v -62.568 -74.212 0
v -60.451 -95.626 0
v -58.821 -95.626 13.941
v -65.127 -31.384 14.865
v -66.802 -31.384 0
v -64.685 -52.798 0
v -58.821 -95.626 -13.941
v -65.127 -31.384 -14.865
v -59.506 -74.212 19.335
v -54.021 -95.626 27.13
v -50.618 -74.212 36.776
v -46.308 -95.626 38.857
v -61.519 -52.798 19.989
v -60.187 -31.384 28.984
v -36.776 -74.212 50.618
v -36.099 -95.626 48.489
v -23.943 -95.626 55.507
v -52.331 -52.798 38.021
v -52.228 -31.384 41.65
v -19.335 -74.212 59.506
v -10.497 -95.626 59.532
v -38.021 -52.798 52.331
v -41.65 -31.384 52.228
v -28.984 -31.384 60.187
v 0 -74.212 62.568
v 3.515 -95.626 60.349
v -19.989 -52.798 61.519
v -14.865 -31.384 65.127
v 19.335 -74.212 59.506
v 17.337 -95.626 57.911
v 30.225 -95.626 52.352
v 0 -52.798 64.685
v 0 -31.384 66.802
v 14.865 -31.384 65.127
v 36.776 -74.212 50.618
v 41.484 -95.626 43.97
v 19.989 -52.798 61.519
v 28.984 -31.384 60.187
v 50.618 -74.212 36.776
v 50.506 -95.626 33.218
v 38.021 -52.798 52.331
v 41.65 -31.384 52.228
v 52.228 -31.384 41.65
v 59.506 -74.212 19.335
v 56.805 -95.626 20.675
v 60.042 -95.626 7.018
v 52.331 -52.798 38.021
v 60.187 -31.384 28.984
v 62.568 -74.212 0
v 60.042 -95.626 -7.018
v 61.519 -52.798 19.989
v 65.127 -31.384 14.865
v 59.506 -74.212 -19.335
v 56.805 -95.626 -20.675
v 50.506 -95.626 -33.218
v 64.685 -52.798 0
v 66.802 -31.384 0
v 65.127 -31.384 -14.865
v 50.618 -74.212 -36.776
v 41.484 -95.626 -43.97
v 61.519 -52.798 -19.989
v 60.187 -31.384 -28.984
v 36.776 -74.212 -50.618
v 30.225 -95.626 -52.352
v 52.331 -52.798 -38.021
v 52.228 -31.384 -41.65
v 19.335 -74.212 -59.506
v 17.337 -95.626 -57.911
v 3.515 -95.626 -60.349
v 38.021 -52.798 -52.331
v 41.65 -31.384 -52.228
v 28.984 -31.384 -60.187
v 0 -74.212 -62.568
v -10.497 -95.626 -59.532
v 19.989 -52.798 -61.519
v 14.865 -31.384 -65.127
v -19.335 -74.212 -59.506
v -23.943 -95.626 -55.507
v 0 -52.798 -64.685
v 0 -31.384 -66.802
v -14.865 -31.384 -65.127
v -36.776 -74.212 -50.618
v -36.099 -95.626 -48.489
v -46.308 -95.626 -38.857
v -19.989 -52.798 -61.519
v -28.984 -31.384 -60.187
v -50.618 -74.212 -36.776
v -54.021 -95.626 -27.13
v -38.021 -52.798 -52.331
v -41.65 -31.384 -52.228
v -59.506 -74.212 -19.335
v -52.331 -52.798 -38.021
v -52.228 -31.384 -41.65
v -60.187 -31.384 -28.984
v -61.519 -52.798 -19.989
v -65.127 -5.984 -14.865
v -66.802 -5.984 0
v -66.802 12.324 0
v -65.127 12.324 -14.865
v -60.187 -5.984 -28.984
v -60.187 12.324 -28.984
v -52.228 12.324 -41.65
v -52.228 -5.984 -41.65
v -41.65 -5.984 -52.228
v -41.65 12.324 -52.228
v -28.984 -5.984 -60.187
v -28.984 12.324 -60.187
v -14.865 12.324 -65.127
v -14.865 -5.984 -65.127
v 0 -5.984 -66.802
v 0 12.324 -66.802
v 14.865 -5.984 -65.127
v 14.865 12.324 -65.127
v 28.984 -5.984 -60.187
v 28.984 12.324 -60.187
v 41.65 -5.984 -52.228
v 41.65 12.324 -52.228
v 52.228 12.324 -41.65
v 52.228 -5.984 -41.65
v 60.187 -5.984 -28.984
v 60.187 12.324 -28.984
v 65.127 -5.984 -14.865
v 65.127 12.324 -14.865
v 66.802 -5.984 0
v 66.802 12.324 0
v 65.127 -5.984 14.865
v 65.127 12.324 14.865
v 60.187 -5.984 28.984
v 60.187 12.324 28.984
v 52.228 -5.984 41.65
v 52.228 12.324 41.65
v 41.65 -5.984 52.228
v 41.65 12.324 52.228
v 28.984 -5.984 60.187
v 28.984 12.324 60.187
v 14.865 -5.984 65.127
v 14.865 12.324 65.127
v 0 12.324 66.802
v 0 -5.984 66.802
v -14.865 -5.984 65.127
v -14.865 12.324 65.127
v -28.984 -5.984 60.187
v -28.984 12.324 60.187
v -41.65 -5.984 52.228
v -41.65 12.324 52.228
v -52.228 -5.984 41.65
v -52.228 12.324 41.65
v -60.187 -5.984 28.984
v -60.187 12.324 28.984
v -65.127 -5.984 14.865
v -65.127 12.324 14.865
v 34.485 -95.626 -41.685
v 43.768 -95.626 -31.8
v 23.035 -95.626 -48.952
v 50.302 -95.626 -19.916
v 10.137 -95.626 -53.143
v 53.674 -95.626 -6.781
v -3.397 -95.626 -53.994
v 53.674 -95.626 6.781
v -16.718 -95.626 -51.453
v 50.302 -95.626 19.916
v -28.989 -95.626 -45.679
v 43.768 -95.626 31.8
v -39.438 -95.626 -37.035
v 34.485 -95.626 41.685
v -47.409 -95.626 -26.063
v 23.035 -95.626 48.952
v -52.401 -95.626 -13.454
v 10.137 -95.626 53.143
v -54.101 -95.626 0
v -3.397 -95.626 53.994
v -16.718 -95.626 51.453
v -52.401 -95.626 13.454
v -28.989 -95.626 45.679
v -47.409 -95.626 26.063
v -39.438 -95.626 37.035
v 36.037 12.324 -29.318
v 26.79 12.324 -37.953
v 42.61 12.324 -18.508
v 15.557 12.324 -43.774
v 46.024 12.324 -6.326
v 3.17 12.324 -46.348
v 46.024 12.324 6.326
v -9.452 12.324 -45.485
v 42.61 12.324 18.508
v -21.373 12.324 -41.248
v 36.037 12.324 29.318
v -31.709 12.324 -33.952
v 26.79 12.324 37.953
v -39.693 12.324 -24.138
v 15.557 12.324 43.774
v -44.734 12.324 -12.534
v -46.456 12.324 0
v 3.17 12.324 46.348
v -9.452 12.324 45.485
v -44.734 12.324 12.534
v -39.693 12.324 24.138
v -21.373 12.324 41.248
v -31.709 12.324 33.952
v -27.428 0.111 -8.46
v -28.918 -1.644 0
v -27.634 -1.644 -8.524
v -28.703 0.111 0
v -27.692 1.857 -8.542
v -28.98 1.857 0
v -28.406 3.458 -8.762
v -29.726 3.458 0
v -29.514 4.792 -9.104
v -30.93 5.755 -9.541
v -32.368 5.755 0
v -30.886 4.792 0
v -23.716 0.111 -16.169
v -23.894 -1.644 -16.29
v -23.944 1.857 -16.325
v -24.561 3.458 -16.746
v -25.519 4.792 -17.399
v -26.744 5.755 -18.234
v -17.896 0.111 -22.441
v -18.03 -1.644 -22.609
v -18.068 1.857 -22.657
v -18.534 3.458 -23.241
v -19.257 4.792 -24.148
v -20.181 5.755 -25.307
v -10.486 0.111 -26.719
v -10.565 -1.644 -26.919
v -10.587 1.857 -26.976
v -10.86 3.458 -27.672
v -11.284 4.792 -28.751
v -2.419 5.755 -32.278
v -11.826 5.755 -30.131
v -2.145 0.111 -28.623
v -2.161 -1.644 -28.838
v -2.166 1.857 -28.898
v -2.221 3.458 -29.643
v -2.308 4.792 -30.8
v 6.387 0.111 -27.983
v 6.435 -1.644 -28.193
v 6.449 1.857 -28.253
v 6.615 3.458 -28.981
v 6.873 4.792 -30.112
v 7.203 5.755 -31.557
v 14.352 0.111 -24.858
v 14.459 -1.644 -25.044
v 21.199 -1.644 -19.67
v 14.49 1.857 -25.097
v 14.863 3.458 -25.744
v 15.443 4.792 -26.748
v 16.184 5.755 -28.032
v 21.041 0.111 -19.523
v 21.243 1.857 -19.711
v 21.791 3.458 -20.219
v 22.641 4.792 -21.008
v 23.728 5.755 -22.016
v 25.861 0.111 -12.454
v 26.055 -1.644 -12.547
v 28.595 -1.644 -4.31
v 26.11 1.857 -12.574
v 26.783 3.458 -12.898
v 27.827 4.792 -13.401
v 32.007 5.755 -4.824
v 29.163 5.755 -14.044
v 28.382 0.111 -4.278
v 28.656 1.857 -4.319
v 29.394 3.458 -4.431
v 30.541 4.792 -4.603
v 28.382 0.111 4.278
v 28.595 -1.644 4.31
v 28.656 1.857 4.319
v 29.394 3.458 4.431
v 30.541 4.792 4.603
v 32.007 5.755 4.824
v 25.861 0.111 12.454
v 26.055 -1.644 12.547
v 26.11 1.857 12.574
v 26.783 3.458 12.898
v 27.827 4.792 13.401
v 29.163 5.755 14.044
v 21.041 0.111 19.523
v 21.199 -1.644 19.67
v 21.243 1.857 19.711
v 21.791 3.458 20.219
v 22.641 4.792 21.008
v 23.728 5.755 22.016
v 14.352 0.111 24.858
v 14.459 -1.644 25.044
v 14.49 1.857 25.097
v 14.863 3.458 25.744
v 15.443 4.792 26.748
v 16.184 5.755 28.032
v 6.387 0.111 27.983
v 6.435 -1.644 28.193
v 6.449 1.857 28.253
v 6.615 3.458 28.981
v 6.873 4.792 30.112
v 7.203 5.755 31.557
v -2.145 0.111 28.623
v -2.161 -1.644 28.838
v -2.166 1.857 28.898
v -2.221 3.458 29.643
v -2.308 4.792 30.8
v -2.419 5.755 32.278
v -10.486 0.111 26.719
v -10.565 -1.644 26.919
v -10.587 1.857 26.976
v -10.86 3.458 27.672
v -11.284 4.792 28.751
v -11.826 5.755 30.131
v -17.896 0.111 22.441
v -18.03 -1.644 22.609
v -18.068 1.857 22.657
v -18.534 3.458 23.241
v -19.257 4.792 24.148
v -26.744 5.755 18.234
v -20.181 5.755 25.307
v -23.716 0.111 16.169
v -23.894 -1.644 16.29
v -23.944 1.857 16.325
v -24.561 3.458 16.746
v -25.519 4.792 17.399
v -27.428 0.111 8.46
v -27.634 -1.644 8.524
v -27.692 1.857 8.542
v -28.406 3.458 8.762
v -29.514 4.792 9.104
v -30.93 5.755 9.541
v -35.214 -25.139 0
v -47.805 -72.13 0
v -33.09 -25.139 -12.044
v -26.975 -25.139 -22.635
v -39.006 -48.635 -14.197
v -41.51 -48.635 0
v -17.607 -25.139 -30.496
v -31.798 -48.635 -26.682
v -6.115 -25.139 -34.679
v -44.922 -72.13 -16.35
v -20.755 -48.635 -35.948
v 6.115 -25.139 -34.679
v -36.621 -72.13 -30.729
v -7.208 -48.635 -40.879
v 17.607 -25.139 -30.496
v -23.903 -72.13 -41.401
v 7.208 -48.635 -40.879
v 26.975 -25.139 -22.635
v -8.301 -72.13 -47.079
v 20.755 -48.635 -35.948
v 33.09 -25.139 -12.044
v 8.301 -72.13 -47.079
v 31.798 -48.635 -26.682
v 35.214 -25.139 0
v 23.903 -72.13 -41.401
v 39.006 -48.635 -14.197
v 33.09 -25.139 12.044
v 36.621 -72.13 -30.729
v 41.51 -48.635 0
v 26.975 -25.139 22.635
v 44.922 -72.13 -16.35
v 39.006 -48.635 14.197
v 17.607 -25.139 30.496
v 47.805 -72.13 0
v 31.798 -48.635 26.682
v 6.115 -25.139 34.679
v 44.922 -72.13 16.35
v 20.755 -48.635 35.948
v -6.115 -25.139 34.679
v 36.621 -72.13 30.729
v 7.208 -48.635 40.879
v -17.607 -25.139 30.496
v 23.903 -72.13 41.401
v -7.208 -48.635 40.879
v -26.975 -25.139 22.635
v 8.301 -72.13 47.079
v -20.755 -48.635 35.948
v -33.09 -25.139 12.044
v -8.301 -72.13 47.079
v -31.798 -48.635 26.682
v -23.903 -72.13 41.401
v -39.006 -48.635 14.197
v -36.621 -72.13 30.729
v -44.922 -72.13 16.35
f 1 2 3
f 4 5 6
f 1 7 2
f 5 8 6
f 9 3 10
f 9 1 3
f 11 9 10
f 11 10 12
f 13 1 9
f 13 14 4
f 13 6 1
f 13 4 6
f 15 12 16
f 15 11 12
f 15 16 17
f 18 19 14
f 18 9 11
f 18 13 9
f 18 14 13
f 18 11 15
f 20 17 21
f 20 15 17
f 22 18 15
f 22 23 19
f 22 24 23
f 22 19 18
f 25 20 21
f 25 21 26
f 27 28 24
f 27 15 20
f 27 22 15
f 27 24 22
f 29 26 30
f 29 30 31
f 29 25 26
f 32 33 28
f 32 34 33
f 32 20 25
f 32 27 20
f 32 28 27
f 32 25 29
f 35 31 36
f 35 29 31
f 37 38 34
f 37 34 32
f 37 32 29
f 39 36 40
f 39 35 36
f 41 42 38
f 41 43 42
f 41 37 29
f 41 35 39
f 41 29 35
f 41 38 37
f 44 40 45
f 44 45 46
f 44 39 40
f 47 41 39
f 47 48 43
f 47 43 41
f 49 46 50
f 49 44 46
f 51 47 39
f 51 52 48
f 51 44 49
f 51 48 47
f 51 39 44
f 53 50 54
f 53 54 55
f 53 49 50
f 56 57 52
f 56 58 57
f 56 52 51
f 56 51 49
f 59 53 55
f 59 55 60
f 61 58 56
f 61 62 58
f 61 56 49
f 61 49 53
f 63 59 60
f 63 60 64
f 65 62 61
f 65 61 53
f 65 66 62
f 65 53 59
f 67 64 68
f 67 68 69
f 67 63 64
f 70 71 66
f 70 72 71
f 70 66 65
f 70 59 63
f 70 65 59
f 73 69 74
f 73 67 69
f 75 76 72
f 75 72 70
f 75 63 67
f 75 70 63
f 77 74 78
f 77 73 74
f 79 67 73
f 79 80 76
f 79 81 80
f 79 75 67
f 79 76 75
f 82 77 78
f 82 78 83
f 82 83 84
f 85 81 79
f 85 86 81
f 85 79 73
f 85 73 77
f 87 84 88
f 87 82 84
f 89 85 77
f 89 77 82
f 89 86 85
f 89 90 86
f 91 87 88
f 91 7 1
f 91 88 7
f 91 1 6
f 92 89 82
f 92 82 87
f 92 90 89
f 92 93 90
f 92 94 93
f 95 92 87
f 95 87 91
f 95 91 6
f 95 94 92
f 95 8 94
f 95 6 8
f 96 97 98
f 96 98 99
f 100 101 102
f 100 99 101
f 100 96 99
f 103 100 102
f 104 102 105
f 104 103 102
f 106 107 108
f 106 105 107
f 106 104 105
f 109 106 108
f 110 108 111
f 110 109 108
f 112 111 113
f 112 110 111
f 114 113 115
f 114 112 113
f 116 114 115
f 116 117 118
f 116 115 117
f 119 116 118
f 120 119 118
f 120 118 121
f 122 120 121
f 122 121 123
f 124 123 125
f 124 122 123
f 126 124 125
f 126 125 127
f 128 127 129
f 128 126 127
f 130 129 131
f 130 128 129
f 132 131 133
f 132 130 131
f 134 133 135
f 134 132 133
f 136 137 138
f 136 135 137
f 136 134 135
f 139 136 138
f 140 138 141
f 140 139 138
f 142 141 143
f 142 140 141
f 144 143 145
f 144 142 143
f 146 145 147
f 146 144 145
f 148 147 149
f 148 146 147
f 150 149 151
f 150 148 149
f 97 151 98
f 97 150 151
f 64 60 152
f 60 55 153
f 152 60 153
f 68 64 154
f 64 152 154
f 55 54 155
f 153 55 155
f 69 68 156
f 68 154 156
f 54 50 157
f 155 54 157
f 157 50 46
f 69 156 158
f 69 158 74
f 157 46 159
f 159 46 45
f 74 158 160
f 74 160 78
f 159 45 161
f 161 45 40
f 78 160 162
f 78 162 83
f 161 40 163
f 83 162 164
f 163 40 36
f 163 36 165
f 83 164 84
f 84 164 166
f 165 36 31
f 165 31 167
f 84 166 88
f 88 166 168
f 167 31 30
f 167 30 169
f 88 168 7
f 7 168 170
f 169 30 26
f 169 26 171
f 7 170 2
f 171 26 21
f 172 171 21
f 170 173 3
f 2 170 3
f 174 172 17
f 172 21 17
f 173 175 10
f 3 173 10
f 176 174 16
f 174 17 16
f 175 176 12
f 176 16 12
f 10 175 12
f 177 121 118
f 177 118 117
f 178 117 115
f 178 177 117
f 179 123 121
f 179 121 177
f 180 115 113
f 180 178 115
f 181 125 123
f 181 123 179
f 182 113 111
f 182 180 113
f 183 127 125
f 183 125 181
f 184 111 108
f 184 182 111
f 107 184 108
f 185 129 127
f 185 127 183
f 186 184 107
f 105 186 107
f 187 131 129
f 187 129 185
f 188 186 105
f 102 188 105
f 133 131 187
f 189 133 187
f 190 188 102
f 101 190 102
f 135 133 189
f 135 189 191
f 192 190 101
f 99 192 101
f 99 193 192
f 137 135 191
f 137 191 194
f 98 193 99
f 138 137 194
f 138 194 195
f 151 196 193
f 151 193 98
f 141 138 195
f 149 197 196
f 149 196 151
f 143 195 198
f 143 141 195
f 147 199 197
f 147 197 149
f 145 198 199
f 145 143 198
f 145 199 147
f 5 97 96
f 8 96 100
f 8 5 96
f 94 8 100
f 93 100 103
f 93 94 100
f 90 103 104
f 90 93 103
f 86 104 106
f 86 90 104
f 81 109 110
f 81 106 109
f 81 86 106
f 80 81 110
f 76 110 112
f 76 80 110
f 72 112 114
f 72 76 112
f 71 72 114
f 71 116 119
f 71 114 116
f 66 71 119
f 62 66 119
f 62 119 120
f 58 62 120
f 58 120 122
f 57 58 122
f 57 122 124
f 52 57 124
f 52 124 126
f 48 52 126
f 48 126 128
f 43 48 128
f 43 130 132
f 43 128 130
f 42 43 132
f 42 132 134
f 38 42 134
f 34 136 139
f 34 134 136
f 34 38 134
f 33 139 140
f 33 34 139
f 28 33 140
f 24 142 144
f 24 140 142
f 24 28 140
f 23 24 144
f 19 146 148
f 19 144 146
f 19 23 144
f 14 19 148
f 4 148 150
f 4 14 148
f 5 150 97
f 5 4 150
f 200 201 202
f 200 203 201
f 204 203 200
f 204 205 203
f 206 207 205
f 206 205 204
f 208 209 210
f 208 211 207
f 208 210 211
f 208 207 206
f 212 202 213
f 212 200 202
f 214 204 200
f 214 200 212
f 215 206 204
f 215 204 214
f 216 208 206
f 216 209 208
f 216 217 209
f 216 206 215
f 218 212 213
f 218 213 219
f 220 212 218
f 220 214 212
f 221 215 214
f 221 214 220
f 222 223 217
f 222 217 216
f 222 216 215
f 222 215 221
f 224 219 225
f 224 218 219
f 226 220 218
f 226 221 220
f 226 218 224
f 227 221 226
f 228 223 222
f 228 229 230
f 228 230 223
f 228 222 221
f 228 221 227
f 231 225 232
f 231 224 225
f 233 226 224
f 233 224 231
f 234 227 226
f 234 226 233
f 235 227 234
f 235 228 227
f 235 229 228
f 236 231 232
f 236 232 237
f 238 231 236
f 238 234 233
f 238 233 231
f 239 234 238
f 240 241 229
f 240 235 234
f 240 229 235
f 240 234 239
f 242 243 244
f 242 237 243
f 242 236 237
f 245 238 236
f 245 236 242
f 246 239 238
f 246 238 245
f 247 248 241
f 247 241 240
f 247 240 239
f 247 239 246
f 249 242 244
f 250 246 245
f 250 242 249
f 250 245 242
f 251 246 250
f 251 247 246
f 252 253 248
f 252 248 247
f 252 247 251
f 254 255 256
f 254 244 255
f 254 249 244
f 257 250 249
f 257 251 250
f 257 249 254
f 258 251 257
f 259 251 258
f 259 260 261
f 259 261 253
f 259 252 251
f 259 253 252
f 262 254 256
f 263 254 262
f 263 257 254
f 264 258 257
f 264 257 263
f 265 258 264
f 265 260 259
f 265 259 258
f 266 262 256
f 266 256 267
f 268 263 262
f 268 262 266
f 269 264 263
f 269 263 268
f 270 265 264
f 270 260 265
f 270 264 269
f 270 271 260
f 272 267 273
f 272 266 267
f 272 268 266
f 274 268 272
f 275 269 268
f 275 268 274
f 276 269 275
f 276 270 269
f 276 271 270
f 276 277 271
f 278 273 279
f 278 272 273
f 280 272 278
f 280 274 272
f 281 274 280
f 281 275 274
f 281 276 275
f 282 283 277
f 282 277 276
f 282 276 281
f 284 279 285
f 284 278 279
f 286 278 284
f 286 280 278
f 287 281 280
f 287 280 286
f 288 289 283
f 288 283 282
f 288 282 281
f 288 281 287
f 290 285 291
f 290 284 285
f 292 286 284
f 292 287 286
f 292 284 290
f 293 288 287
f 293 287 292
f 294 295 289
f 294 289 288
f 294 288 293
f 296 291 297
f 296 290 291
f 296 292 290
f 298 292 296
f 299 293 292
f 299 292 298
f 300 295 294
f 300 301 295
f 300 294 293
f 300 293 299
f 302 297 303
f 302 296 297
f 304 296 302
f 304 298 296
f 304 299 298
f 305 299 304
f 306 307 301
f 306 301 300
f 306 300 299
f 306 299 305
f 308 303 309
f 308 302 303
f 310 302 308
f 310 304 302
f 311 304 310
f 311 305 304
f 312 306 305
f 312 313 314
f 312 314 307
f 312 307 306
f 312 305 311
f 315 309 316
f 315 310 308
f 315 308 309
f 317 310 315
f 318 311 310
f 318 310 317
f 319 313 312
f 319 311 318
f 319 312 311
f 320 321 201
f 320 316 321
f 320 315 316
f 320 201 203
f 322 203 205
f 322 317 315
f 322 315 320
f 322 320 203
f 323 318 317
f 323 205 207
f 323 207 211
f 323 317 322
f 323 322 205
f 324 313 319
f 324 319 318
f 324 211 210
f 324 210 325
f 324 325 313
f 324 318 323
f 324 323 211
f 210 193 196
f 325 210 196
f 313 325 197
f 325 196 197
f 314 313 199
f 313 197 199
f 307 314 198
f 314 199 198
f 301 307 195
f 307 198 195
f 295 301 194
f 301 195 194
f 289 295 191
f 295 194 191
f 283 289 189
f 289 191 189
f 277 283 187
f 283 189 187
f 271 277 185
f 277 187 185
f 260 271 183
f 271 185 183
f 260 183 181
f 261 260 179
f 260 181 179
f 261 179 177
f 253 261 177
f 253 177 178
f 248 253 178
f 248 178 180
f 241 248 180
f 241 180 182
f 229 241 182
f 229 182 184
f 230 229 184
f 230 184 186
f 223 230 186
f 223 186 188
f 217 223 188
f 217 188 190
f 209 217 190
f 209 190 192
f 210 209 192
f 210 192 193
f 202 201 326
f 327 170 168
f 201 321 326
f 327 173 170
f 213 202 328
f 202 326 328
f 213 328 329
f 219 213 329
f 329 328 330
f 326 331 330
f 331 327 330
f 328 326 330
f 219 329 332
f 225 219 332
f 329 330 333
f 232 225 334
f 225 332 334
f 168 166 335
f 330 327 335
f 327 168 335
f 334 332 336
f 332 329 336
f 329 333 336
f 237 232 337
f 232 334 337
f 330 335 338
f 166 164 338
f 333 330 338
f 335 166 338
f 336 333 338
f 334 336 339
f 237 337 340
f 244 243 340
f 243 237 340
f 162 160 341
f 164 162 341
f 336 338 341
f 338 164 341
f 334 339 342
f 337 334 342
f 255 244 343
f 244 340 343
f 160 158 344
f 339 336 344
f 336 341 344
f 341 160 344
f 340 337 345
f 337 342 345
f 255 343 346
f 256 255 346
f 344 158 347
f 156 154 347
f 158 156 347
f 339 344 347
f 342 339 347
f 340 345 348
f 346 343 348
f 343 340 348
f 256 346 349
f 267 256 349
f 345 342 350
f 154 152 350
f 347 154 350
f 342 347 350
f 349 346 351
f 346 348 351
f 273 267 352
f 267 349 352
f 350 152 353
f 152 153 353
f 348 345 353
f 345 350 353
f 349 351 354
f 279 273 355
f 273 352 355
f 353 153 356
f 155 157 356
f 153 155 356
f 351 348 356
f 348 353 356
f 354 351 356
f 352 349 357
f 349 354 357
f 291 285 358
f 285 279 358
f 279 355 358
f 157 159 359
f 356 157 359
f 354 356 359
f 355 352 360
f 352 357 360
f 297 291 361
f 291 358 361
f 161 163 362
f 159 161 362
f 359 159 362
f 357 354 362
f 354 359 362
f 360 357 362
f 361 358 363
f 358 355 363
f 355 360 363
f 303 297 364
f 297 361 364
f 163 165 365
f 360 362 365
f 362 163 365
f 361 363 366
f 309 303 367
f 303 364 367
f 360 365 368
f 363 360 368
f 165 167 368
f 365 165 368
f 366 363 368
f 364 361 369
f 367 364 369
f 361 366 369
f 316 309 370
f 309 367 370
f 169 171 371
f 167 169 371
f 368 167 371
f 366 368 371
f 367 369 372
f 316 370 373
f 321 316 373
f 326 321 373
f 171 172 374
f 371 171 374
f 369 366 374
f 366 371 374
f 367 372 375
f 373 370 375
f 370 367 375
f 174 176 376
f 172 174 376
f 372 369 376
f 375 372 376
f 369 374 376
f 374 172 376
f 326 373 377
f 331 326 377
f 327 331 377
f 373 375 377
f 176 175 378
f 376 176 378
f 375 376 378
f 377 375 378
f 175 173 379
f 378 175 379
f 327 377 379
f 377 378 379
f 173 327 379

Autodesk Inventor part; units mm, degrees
ref_plane "YZ Plane" through (0, 0, 0) normal (1, 0, 0) x (0, 1, 0)
ref_plane "XZ Plane" through (0, 0, 0) normal (0, 1, 0) x (-1, 0, 0)
ref_plane "XY Plane" through (0, 0, 0) normal (0, 0, 1) x (1, 0, 0)
sketch "Sketch1" plane through (0, 0, 0) normal (0, 0, 1) x (1, 0, 0)
  arc A0 (-28.9184, -1.6435) -> (-32.3684, 5.7551) centre (-35.052, 0) ccw
  line L0 (-28.702, 47.5942) -> (-28.702, -124.4009) construction
  line L1 (-32.3684, 5.7551) -> (-88.9, 32.1162)
  line L2 (-28.9184, -1.6435) -> (-86.2301, -215.5338)
  line L3 (-46.4564, 12.3244) -> (-66.802, 12.3244)
  line L4 (-60.4508, -95.6256) -> (-54.1008, -95.6256)
  line L5 (-73.152, -5.9838) -> (-73.152, -131.1779)
  line L6 (-73.152, -131.1779) -> (-63.627, -131.1779)
  line L7 (58.5667, 38.1) -> (-194.088, 38.1) construction
  line L8 (-95.25, 6.7162) -> (-95.25, -5.9838)
  line L9 (-95.25, 6.7162) -> (-88.9, 6.7162)
  line L10 (-88.9, 6.7162) -> (-88.9, 32.1162)
  line L11 (-95.25, -5.9838) -> (-73.152, -5.9838)
  line L12 (-95.25, -5.9838) -> (-95.25, -18.6838)
  line L13 (-95.25, -18.6838) -> (-89.3064, -18.6838)
  line L14 (-89.3064, -18.6838) -> (-89.3064, -24.6274)
  line L15 (-89.3064, -24.6274) -> (-95.25, -24.6274)
  line L16 (-95.25, -24.6274) -> (-95.25, -82.1838)
  line L17 (-95.25, -82.1838) -> (-82.55, -82.1838)
  line L18 (-89.3064, -18.6838) -> (-82.55, -18.6838)
  line L19 (-82.55, -18.6838) -> (-82.55, -82.1838)
  line L20 (-95.25, -82.1838) -> (-101.6, -82.1838)
  line L21 (-66.802, 12.3244) -> (-66.802, -31.3838)
  line L22 (-66.802, -31.3838) -> (-60.4508, -95.6256)
  line L23 (-82.55, -178.1009) -> (-76.2, -178.1009)
  line L24 (-82.55, -82.1838) -> (-82.55, -178.1009)
  line L25 (-86.2301, -215.5338) -> (-89.4051, -215.5338)
  line L26 (-89.4051, -215.5338) -> (-101.6, -82.1838)
  line L27 (-69.977, -5.9838) -> (-69.977, -31.3838)
  line L28 (-69.977, -31.3838) -> (-73.152, -31.3838)
  line L29 (-69.977, -5.9838) -> (-66.802, -5.9838)
  line L30 (-101.6, -82.1838) -> (-28.702, -82.1838) construction
  line L31 (0, -268.1594) -> (0, 100.2199) projected
  point P0 (0, 0)
  dimension "d0" = 12.7
  dimension "d1" = 28.702
  dimension "d3" = 15
  dimension "d4" = 6.35
  dimension "d9" = 38.1
  dimension "d11" = 12.7
  dimension "d13" = 95.25
  dimension "d14" = 6.35
  dimension "d15" = 25.4
  dimension "d17" = 12.7
  dimension "d18" = 5.9436
  dimension "d19" = 5.9436
  dimension "d20" = 12.7
  dimension "d22" = 107.95
  dimension "d23" = 63.5
  dimension "d25" = 25.4
  dimension "d26" = 6.35
  dimension "d27" = 133.35
  dimension "d28" = 3.175
  dimension "d29" = 101.6
  dimension "d30" = 6.35
  dimension "d31" = 25
  dimension "d32" = 44.45
  dimension "d33" = 3.175
  dimension "d34" = 20.3456
  dimension "d35" = 9.525
revolve "Revolution1" add sketch "Sketch1" angle 360 about axis through (0, -10, 0) along (0, 1, 0) contours L2 L4 L22 L21 L3 L1 A0
properties part number "graphite" material "GFRC"
